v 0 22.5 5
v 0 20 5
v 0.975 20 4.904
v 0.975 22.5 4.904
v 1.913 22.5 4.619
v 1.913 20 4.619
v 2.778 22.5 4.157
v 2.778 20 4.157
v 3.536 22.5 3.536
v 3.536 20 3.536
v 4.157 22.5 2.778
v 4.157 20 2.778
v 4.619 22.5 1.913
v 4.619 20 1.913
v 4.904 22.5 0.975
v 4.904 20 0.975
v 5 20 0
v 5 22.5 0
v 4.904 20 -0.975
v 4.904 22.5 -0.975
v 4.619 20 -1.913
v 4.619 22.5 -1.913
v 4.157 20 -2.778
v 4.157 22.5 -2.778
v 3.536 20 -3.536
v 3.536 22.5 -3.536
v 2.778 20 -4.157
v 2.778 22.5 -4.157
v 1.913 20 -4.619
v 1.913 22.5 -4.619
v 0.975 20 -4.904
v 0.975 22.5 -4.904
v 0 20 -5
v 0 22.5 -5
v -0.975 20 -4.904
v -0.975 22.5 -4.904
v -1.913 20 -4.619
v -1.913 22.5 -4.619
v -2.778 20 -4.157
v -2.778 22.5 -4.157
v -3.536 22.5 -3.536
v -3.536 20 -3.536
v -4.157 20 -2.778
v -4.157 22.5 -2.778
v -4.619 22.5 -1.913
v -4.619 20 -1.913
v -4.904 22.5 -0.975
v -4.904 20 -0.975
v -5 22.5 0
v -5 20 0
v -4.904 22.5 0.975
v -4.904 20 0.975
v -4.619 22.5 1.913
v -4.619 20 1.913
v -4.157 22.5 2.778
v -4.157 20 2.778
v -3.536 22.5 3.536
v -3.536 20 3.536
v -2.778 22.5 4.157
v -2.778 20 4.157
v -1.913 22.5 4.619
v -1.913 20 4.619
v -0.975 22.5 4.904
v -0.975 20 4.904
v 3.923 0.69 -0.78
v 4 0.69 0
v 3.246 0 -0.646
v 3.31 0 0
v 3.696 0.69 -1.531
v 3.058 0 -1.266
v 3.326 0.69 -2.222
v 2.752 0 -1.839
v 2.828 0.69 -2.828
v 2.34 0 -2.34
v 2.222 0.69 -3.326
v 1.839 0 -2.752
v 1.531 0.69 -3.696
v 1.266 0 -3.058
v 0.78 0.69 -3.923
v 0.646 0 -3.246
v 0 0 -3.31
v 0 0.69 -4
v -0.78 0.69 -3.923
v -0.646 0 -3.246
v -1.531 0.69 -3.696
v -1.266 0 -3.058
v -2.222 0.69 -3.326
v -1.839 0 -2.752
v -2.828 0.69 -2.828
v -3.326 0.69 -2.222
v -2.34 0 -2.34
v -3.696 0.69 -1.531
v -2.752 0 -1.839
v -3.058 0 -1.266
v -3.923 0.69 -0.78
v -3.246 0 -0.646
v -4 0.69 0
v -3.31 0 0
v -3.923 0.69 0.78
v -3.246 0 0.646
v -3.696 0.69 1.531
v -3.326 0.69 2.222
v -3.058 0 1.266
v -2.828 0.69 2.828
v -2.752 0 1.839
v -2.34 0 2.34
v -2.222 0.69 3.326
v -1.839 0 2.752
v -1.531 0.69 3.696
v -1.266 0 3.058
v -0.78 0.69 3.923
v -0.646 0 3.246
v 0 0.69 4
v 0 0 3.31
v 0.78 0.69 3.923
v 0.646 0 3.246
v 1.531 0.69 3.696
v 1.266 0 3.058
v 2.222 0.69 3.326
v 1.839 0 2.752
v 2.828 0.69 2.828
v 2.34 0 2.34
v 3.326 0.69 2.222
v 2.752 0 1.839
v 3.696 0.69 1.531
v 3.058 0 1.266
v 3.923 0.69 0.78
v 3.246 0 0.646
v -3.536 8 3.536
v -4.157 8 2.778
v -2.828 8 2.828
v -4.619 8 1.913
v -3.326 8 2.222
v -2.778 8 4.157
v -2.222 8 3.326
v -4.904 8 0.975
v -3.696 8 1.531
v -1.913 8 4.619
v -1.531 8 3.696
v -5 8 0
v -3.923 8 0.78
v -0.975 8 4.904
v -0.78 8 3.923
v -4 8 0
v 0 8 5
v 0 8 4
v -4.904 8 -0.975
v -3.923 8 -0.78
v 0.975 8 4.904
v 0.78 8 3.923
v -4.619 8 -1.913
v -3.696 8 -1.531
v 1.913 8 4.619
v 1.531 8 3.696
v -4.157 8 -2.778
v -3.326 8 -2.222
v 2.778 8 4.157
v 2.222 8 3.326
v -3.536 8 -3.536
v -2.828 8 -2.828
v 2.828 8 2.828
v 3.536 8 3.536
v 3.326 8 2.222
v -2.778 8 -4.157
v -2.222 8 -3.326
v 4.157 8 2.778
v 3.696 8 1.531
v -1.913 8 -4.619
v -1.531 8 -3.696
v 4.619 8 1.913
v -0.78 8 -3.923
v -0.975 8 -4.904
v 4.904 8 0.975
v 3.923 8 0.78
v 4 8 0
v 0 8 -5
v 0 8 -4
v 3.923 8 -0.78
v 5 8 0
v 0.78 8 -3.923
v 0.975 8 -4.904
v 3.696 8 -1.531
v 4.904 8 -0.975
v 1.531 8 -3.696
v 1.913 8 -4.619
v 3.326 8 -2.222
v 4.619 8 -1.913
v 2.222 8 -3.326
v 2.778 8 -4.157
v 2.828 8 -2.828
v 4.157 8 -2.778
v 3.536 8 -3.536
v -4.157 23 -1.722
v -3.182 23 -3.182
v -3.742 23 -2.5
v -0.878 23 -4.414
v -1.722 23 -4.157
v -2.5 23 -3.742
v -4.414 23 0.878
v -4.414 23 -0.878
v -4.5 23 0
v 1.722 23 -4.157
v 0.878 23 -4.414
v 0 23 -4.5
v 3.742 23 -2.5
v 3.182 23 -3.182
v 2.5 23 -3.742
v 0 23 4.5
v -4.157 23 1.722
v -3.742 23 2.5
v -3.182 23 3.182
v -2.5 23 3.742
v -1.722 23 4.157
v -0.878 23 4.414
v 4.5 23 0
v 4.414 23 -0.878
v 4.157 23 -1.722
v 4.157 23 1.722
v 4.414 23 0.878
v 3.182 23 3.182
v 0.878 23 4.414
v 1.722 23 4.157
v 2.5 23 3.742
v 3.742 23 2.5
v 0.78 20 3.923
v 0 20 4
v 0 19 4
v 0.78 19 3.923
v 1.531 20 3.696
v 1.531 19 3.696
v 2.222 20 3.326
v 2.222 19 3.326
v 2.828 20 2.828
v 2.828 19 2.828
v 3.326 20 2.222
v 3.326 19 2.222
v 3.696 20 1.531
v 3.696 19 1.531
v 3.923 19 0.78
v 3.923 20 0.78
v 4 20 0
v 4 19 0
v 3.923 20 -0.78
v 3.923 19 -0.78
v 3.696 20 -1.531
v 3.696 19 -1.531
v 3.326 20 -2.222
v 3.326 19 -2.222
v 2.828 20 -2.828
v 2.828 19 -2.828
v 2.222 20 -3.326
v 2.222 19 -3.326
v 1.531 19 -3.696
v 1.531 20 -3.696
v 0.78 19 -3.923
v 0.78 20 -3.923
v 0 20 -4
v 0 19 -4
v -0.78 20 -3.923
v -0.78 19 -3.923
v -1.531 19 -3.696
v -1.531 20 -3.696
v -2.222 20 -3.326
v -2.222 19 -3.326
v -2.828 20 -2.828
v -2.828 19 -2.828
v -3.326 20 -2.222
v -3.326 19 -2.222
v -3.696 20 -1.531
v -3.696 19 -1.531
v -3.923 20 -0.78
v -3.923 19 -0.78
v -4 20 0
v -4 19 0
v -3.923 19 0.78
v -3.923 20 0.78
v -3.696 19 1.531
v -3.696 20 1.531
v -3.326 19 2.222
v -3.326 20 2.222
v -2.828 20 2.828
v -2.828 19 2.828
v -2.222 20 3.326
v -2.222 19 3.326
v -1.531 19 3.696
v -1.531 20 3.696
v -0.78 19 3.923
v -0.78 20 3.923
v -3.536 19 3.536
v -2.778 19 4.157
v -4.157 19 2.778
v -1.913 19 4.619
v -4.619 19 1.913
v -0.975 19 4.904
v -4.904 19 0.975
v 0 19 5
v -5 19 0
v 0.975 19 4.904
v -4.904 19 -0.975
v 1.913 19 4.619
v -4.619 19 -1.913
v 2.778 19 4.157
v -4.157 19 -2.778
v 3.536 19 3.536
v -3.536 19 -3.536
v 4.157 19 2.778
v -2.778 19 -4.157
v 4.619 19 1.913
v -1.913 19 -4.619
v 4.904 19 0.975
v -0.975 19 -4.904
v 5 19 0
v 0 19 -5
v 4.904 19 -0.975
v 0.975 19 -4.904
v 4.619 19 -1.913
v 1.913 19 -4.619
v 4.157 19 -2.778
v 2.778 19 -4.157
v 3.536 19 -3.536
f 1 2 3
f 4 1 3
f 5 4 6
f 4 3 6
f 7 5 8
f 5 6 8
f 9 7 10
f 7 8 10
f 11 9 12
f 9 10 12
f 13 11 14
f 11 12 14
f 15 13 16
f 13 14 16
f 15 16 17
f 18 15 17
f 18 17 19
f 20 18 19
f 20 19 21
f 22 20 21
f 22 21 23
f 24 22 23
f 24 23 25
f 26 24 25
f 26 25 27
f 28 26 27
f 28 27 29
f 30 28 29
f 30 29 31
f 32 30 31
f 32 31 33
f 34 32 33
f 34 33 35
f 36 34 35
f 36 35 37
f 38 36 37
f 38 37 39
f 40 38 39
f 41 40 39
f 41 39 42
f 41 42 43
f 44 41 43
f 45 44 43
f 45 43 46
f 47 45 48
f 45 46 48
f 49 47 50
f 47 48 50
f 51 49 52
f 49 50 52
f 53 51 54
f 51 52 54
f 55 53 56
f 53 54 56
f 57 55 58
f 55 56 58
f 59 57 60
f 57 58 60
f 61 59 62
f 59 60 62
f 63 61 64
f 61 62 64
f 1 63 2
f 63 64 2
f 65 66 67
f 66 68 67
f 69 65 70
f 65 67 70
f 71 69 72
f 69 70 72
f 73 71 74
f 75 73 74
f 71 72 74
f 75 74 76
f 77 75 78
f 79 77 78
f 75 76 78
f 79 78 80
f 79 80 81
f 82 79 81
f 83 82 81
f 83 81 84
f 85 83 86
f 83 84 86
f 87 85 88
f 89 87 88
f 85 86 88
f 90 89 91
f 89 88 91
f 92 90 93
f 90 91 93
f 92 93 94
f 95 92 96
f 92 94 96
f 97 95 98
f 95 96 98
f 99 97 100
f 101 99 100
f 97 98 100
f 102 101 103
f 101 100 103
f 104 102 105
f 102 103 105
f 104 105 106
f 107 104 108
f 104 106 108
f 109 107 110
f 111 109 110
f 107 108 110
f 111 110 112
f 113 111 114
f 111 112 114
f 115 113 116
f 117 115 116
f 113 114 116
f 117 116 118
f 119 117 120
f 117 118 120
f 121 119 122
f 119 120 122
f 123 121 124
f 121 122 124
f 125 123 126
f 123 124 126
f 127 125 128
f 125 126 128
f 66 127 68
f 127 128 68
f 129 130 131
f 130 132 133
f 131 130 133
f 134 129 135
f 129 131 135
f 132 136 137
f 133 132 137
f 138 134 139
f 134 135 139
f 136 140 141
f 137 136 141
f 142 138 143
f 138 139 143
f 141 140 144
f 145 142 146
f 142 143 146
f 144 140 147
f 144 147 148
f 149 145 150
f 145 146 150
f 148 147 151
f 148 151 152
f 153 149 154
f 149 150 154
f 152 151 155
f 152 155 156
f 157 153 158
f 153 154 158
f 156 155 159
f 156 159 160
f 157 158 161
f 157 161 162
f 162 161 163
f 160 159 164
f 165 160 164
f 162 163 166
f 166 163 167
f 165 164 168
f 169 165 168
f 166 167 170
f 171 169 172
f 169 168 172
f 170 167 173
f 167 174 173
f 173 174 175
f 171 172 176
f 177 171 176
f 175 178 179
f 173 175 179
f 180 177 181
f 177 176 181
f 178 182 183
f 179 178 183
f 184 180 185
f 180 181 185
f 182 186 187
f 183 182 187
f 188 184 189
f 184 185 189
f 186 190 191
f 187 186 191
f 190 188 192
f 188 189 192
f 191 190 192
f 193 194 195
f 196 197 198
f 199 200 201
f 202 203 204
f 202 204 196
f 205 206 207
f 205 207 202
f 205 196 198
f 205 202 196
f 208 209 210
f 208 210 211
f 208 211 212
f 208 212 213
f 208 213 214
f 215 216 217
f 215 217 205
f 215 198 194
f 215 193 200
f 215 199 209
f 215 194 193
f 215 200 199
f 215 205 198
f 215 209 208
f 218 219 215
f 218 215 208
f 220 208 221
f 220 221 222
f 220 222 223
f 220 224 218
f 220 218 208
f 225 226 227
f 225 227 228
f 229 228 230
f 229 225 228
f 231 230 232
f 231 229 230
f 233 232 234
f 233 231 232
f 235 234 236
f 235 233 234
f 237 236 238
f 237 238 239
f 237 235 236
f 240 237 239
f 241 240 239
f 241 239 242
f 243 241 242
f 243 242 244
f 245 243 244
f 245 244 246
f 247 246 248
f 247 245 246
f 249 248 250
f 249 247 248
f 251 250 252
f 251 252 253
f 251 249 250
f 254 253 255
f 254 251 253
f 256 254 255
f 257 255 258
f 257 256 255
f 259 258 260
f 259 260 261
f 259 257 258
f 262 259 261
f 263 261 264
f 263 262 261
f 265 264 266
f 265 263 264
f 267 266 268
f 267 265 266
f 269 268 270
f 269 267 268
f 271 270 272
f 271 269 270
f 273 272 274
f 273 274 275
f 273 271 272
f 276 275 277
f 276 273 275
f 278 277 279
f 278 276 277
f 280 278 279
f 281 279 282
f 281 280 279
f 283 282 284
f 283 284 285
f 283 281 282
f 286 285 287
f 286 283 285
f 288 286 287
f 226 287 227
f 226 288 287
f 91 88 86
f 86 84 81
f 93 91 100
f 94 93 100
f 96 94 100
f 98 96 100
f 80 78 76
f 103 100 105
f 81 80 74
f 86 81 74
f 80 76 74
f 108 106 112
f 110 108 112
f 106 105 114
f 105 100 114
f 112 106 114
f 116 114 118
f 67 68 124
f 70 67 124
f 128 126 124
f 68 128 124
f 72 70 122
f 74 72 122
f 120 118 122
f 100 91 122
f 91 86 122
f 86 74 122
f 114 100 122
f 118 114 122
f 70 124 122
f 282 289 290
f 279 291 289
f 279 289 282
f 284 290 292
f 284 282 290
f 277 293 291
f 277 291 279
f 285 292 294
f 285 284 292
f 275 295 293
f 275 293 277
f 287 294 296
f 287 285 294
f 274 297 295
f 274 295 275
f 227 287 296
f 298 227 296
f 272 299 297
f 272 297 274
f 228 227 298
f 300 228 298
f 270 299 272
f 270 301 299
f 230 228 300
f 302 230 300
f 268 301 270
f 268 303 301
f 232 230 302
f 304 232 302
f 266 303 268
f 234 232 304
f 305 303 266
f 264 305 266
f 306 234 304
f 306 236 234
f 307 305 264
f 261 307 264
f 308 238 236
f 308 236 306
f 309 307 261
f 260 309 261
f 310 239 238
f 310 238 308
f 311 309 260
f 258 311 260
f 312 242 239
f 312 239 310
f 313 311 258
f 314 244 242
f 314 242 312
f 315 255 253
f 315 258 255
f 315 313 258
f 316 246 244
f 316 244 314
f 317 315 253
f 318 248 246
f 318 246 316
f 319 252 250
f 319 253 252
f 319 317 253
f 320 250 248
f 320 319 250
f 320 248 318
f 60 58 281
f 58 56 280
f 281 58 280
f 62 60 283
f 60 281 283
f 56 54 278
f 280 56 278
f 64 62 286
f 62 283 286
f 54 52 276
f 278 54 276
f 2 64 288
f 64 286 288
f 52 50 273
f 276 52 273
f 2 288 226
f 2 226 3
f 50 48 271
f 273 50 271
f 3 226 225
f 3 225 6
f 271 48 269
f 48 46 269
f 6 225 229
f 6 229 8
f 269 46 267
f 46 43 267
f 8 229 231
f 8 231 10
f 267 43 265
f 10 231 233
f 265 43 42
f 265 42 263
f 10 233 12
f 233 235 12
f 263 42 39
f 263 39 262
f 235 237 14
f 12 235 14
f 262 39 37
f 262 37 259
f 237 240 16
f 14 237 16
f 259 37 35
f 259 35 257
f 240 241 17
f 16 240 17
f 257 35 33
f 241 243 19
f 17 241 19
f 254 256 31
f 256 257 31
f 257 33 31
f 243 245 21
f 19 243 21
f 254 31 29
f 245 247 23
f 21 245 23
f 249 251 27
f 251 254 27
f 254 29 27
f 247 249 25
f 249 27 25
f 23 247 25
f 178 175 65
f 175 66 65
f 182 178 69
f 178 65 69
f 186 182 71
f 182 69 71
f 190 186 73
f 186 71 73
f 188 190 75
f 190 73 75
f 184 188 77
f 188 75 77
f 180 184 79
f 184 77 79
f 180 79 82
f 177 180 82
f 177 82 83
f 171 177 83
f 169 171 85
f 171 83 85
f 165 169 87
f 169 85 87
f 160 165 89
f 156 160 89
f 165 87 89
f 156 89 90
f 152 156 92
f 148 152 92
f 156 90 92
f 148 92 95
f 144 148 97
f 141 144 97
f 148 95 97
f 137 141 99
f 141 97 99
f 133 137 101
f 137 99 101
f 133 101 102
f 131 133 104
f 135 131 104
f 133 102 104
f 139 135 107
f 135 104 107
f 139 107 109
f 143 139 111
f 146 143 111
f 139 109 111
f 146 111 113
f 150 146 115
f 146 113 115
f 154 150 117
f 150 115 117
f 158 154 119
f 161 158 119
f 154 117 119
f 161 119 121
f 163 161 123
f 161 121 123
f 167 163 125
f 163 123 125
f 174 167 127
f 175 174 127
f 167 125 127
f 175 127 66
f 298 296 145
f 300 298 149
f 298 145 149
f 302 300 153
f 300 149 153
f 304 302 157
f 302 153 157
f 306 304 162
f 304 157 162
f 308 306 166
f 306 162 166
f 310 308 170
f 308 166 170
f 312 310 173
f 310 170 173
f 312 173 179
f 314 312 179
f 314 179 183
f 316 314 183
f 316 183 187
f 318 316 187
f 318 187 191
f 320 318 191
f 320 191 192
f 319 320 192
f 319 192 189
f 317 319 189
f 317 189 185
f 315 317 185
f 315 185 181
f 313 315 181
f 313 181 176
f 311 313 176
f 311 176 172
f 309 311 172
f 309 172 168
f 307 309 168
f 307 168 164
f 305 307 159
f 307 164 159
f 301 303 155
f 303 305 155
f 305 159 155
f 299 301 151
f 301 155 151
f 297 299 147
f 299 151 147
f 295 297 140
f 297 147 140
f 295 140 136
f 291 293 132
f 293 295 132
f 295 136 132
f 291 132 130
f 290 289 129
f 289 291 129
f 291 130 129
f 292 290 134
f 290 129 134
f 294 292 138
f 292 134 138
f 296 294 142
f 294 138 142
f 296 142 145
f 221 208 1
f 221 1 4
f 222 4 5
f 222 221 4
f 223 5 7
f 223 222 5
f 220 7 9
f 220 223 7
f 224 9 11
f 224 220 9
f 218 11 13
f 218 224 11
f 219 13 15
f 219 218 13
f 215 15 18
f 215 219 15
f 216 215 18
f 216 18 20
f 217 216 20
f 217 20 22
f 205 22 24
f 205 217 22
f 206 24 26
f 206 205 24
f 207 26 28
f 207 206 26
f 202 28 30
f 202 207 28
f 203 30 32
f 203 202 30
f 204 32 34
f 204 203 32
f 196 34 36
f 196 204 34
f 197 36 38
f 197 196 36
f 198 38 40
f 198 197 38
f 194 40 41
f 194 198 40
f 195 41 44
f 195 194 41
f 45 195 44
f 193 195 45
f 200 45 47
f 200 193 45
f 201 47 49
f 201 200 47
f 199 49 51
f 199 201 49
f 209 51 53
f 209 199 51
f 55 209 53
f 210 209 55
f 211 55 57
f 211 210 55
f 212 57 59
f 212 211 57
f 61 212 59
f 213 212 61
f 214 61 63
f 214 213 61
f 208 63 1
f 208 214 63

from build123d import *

# Parameters (mm, degrees)
SKETCH1_R           = 5
BOSS_EXTRUDE1_DEPTH = 23
CHAMFER1_SIZE       = 0.5
CUT_EXTRUDE1_START  = -3
SKETCH2_R           = 6
SKETCH2_R_2         = 4
CUT_EXTRUDE1_DEPTH  = 1


# Read off the part's stored shape, not the designer's step: M8 Machine Threads Stud1
with BuildPart() as part:
    # Sketch1 → Boss-Extrude1 (new body)
    with BuildSketch(Plane(origin=(0, 0, 0), x_dir=(1, 0, 0), z_dir=(0, 1, 0))):
        with Locations(Location((0, 0, 0), (0, 0, 270))):
            Circle(SKETCH1_R)
    extrude(amount=BOSS_EXTRUDE1_DEPTH)

    # Chamfer1
    chamfer1_edges = [part.edges().sort_by_distance(p)[0] for p in [
        (0, 23, -5),
    ]]
    chamfer(chamfer1_edges, length=CHAMFER1_SIZE)

    # Sketch2 → Cut-Extrude1 (cut)
    with BuildSketch(Plane(origin=(0, 23, 0), x_dir=(1, 0, 0), z_dir=(0, 1, 0)).offset(CUT_EXTRUDE1_START)):
        Circle(SKETCH2_R)
        with Locations(Location((0, 0, 0), (0, 0, 270))):
            Circle(SKETCH2_R_2, mode=Mode.SUBTRACT)
    extrude(amount=-CUT_EXTRUDE1_DEPTH, mode=Mode.SUBTRACT)

    # M8 Machine Threads Stud1 outline → M8 Machine Threads Stud1 (revolve, cut)
    with BuildSketch(Plane.XY):
        Polygon((3.3095, 0), (5, 0), (5, 8), (4, 8), (4, 0.6905), align=None)
    revolve(axis=Axis((0, 0, 0), (0, 1, 0)), mode=Mode.SUBTRACT)


solid = part.part
